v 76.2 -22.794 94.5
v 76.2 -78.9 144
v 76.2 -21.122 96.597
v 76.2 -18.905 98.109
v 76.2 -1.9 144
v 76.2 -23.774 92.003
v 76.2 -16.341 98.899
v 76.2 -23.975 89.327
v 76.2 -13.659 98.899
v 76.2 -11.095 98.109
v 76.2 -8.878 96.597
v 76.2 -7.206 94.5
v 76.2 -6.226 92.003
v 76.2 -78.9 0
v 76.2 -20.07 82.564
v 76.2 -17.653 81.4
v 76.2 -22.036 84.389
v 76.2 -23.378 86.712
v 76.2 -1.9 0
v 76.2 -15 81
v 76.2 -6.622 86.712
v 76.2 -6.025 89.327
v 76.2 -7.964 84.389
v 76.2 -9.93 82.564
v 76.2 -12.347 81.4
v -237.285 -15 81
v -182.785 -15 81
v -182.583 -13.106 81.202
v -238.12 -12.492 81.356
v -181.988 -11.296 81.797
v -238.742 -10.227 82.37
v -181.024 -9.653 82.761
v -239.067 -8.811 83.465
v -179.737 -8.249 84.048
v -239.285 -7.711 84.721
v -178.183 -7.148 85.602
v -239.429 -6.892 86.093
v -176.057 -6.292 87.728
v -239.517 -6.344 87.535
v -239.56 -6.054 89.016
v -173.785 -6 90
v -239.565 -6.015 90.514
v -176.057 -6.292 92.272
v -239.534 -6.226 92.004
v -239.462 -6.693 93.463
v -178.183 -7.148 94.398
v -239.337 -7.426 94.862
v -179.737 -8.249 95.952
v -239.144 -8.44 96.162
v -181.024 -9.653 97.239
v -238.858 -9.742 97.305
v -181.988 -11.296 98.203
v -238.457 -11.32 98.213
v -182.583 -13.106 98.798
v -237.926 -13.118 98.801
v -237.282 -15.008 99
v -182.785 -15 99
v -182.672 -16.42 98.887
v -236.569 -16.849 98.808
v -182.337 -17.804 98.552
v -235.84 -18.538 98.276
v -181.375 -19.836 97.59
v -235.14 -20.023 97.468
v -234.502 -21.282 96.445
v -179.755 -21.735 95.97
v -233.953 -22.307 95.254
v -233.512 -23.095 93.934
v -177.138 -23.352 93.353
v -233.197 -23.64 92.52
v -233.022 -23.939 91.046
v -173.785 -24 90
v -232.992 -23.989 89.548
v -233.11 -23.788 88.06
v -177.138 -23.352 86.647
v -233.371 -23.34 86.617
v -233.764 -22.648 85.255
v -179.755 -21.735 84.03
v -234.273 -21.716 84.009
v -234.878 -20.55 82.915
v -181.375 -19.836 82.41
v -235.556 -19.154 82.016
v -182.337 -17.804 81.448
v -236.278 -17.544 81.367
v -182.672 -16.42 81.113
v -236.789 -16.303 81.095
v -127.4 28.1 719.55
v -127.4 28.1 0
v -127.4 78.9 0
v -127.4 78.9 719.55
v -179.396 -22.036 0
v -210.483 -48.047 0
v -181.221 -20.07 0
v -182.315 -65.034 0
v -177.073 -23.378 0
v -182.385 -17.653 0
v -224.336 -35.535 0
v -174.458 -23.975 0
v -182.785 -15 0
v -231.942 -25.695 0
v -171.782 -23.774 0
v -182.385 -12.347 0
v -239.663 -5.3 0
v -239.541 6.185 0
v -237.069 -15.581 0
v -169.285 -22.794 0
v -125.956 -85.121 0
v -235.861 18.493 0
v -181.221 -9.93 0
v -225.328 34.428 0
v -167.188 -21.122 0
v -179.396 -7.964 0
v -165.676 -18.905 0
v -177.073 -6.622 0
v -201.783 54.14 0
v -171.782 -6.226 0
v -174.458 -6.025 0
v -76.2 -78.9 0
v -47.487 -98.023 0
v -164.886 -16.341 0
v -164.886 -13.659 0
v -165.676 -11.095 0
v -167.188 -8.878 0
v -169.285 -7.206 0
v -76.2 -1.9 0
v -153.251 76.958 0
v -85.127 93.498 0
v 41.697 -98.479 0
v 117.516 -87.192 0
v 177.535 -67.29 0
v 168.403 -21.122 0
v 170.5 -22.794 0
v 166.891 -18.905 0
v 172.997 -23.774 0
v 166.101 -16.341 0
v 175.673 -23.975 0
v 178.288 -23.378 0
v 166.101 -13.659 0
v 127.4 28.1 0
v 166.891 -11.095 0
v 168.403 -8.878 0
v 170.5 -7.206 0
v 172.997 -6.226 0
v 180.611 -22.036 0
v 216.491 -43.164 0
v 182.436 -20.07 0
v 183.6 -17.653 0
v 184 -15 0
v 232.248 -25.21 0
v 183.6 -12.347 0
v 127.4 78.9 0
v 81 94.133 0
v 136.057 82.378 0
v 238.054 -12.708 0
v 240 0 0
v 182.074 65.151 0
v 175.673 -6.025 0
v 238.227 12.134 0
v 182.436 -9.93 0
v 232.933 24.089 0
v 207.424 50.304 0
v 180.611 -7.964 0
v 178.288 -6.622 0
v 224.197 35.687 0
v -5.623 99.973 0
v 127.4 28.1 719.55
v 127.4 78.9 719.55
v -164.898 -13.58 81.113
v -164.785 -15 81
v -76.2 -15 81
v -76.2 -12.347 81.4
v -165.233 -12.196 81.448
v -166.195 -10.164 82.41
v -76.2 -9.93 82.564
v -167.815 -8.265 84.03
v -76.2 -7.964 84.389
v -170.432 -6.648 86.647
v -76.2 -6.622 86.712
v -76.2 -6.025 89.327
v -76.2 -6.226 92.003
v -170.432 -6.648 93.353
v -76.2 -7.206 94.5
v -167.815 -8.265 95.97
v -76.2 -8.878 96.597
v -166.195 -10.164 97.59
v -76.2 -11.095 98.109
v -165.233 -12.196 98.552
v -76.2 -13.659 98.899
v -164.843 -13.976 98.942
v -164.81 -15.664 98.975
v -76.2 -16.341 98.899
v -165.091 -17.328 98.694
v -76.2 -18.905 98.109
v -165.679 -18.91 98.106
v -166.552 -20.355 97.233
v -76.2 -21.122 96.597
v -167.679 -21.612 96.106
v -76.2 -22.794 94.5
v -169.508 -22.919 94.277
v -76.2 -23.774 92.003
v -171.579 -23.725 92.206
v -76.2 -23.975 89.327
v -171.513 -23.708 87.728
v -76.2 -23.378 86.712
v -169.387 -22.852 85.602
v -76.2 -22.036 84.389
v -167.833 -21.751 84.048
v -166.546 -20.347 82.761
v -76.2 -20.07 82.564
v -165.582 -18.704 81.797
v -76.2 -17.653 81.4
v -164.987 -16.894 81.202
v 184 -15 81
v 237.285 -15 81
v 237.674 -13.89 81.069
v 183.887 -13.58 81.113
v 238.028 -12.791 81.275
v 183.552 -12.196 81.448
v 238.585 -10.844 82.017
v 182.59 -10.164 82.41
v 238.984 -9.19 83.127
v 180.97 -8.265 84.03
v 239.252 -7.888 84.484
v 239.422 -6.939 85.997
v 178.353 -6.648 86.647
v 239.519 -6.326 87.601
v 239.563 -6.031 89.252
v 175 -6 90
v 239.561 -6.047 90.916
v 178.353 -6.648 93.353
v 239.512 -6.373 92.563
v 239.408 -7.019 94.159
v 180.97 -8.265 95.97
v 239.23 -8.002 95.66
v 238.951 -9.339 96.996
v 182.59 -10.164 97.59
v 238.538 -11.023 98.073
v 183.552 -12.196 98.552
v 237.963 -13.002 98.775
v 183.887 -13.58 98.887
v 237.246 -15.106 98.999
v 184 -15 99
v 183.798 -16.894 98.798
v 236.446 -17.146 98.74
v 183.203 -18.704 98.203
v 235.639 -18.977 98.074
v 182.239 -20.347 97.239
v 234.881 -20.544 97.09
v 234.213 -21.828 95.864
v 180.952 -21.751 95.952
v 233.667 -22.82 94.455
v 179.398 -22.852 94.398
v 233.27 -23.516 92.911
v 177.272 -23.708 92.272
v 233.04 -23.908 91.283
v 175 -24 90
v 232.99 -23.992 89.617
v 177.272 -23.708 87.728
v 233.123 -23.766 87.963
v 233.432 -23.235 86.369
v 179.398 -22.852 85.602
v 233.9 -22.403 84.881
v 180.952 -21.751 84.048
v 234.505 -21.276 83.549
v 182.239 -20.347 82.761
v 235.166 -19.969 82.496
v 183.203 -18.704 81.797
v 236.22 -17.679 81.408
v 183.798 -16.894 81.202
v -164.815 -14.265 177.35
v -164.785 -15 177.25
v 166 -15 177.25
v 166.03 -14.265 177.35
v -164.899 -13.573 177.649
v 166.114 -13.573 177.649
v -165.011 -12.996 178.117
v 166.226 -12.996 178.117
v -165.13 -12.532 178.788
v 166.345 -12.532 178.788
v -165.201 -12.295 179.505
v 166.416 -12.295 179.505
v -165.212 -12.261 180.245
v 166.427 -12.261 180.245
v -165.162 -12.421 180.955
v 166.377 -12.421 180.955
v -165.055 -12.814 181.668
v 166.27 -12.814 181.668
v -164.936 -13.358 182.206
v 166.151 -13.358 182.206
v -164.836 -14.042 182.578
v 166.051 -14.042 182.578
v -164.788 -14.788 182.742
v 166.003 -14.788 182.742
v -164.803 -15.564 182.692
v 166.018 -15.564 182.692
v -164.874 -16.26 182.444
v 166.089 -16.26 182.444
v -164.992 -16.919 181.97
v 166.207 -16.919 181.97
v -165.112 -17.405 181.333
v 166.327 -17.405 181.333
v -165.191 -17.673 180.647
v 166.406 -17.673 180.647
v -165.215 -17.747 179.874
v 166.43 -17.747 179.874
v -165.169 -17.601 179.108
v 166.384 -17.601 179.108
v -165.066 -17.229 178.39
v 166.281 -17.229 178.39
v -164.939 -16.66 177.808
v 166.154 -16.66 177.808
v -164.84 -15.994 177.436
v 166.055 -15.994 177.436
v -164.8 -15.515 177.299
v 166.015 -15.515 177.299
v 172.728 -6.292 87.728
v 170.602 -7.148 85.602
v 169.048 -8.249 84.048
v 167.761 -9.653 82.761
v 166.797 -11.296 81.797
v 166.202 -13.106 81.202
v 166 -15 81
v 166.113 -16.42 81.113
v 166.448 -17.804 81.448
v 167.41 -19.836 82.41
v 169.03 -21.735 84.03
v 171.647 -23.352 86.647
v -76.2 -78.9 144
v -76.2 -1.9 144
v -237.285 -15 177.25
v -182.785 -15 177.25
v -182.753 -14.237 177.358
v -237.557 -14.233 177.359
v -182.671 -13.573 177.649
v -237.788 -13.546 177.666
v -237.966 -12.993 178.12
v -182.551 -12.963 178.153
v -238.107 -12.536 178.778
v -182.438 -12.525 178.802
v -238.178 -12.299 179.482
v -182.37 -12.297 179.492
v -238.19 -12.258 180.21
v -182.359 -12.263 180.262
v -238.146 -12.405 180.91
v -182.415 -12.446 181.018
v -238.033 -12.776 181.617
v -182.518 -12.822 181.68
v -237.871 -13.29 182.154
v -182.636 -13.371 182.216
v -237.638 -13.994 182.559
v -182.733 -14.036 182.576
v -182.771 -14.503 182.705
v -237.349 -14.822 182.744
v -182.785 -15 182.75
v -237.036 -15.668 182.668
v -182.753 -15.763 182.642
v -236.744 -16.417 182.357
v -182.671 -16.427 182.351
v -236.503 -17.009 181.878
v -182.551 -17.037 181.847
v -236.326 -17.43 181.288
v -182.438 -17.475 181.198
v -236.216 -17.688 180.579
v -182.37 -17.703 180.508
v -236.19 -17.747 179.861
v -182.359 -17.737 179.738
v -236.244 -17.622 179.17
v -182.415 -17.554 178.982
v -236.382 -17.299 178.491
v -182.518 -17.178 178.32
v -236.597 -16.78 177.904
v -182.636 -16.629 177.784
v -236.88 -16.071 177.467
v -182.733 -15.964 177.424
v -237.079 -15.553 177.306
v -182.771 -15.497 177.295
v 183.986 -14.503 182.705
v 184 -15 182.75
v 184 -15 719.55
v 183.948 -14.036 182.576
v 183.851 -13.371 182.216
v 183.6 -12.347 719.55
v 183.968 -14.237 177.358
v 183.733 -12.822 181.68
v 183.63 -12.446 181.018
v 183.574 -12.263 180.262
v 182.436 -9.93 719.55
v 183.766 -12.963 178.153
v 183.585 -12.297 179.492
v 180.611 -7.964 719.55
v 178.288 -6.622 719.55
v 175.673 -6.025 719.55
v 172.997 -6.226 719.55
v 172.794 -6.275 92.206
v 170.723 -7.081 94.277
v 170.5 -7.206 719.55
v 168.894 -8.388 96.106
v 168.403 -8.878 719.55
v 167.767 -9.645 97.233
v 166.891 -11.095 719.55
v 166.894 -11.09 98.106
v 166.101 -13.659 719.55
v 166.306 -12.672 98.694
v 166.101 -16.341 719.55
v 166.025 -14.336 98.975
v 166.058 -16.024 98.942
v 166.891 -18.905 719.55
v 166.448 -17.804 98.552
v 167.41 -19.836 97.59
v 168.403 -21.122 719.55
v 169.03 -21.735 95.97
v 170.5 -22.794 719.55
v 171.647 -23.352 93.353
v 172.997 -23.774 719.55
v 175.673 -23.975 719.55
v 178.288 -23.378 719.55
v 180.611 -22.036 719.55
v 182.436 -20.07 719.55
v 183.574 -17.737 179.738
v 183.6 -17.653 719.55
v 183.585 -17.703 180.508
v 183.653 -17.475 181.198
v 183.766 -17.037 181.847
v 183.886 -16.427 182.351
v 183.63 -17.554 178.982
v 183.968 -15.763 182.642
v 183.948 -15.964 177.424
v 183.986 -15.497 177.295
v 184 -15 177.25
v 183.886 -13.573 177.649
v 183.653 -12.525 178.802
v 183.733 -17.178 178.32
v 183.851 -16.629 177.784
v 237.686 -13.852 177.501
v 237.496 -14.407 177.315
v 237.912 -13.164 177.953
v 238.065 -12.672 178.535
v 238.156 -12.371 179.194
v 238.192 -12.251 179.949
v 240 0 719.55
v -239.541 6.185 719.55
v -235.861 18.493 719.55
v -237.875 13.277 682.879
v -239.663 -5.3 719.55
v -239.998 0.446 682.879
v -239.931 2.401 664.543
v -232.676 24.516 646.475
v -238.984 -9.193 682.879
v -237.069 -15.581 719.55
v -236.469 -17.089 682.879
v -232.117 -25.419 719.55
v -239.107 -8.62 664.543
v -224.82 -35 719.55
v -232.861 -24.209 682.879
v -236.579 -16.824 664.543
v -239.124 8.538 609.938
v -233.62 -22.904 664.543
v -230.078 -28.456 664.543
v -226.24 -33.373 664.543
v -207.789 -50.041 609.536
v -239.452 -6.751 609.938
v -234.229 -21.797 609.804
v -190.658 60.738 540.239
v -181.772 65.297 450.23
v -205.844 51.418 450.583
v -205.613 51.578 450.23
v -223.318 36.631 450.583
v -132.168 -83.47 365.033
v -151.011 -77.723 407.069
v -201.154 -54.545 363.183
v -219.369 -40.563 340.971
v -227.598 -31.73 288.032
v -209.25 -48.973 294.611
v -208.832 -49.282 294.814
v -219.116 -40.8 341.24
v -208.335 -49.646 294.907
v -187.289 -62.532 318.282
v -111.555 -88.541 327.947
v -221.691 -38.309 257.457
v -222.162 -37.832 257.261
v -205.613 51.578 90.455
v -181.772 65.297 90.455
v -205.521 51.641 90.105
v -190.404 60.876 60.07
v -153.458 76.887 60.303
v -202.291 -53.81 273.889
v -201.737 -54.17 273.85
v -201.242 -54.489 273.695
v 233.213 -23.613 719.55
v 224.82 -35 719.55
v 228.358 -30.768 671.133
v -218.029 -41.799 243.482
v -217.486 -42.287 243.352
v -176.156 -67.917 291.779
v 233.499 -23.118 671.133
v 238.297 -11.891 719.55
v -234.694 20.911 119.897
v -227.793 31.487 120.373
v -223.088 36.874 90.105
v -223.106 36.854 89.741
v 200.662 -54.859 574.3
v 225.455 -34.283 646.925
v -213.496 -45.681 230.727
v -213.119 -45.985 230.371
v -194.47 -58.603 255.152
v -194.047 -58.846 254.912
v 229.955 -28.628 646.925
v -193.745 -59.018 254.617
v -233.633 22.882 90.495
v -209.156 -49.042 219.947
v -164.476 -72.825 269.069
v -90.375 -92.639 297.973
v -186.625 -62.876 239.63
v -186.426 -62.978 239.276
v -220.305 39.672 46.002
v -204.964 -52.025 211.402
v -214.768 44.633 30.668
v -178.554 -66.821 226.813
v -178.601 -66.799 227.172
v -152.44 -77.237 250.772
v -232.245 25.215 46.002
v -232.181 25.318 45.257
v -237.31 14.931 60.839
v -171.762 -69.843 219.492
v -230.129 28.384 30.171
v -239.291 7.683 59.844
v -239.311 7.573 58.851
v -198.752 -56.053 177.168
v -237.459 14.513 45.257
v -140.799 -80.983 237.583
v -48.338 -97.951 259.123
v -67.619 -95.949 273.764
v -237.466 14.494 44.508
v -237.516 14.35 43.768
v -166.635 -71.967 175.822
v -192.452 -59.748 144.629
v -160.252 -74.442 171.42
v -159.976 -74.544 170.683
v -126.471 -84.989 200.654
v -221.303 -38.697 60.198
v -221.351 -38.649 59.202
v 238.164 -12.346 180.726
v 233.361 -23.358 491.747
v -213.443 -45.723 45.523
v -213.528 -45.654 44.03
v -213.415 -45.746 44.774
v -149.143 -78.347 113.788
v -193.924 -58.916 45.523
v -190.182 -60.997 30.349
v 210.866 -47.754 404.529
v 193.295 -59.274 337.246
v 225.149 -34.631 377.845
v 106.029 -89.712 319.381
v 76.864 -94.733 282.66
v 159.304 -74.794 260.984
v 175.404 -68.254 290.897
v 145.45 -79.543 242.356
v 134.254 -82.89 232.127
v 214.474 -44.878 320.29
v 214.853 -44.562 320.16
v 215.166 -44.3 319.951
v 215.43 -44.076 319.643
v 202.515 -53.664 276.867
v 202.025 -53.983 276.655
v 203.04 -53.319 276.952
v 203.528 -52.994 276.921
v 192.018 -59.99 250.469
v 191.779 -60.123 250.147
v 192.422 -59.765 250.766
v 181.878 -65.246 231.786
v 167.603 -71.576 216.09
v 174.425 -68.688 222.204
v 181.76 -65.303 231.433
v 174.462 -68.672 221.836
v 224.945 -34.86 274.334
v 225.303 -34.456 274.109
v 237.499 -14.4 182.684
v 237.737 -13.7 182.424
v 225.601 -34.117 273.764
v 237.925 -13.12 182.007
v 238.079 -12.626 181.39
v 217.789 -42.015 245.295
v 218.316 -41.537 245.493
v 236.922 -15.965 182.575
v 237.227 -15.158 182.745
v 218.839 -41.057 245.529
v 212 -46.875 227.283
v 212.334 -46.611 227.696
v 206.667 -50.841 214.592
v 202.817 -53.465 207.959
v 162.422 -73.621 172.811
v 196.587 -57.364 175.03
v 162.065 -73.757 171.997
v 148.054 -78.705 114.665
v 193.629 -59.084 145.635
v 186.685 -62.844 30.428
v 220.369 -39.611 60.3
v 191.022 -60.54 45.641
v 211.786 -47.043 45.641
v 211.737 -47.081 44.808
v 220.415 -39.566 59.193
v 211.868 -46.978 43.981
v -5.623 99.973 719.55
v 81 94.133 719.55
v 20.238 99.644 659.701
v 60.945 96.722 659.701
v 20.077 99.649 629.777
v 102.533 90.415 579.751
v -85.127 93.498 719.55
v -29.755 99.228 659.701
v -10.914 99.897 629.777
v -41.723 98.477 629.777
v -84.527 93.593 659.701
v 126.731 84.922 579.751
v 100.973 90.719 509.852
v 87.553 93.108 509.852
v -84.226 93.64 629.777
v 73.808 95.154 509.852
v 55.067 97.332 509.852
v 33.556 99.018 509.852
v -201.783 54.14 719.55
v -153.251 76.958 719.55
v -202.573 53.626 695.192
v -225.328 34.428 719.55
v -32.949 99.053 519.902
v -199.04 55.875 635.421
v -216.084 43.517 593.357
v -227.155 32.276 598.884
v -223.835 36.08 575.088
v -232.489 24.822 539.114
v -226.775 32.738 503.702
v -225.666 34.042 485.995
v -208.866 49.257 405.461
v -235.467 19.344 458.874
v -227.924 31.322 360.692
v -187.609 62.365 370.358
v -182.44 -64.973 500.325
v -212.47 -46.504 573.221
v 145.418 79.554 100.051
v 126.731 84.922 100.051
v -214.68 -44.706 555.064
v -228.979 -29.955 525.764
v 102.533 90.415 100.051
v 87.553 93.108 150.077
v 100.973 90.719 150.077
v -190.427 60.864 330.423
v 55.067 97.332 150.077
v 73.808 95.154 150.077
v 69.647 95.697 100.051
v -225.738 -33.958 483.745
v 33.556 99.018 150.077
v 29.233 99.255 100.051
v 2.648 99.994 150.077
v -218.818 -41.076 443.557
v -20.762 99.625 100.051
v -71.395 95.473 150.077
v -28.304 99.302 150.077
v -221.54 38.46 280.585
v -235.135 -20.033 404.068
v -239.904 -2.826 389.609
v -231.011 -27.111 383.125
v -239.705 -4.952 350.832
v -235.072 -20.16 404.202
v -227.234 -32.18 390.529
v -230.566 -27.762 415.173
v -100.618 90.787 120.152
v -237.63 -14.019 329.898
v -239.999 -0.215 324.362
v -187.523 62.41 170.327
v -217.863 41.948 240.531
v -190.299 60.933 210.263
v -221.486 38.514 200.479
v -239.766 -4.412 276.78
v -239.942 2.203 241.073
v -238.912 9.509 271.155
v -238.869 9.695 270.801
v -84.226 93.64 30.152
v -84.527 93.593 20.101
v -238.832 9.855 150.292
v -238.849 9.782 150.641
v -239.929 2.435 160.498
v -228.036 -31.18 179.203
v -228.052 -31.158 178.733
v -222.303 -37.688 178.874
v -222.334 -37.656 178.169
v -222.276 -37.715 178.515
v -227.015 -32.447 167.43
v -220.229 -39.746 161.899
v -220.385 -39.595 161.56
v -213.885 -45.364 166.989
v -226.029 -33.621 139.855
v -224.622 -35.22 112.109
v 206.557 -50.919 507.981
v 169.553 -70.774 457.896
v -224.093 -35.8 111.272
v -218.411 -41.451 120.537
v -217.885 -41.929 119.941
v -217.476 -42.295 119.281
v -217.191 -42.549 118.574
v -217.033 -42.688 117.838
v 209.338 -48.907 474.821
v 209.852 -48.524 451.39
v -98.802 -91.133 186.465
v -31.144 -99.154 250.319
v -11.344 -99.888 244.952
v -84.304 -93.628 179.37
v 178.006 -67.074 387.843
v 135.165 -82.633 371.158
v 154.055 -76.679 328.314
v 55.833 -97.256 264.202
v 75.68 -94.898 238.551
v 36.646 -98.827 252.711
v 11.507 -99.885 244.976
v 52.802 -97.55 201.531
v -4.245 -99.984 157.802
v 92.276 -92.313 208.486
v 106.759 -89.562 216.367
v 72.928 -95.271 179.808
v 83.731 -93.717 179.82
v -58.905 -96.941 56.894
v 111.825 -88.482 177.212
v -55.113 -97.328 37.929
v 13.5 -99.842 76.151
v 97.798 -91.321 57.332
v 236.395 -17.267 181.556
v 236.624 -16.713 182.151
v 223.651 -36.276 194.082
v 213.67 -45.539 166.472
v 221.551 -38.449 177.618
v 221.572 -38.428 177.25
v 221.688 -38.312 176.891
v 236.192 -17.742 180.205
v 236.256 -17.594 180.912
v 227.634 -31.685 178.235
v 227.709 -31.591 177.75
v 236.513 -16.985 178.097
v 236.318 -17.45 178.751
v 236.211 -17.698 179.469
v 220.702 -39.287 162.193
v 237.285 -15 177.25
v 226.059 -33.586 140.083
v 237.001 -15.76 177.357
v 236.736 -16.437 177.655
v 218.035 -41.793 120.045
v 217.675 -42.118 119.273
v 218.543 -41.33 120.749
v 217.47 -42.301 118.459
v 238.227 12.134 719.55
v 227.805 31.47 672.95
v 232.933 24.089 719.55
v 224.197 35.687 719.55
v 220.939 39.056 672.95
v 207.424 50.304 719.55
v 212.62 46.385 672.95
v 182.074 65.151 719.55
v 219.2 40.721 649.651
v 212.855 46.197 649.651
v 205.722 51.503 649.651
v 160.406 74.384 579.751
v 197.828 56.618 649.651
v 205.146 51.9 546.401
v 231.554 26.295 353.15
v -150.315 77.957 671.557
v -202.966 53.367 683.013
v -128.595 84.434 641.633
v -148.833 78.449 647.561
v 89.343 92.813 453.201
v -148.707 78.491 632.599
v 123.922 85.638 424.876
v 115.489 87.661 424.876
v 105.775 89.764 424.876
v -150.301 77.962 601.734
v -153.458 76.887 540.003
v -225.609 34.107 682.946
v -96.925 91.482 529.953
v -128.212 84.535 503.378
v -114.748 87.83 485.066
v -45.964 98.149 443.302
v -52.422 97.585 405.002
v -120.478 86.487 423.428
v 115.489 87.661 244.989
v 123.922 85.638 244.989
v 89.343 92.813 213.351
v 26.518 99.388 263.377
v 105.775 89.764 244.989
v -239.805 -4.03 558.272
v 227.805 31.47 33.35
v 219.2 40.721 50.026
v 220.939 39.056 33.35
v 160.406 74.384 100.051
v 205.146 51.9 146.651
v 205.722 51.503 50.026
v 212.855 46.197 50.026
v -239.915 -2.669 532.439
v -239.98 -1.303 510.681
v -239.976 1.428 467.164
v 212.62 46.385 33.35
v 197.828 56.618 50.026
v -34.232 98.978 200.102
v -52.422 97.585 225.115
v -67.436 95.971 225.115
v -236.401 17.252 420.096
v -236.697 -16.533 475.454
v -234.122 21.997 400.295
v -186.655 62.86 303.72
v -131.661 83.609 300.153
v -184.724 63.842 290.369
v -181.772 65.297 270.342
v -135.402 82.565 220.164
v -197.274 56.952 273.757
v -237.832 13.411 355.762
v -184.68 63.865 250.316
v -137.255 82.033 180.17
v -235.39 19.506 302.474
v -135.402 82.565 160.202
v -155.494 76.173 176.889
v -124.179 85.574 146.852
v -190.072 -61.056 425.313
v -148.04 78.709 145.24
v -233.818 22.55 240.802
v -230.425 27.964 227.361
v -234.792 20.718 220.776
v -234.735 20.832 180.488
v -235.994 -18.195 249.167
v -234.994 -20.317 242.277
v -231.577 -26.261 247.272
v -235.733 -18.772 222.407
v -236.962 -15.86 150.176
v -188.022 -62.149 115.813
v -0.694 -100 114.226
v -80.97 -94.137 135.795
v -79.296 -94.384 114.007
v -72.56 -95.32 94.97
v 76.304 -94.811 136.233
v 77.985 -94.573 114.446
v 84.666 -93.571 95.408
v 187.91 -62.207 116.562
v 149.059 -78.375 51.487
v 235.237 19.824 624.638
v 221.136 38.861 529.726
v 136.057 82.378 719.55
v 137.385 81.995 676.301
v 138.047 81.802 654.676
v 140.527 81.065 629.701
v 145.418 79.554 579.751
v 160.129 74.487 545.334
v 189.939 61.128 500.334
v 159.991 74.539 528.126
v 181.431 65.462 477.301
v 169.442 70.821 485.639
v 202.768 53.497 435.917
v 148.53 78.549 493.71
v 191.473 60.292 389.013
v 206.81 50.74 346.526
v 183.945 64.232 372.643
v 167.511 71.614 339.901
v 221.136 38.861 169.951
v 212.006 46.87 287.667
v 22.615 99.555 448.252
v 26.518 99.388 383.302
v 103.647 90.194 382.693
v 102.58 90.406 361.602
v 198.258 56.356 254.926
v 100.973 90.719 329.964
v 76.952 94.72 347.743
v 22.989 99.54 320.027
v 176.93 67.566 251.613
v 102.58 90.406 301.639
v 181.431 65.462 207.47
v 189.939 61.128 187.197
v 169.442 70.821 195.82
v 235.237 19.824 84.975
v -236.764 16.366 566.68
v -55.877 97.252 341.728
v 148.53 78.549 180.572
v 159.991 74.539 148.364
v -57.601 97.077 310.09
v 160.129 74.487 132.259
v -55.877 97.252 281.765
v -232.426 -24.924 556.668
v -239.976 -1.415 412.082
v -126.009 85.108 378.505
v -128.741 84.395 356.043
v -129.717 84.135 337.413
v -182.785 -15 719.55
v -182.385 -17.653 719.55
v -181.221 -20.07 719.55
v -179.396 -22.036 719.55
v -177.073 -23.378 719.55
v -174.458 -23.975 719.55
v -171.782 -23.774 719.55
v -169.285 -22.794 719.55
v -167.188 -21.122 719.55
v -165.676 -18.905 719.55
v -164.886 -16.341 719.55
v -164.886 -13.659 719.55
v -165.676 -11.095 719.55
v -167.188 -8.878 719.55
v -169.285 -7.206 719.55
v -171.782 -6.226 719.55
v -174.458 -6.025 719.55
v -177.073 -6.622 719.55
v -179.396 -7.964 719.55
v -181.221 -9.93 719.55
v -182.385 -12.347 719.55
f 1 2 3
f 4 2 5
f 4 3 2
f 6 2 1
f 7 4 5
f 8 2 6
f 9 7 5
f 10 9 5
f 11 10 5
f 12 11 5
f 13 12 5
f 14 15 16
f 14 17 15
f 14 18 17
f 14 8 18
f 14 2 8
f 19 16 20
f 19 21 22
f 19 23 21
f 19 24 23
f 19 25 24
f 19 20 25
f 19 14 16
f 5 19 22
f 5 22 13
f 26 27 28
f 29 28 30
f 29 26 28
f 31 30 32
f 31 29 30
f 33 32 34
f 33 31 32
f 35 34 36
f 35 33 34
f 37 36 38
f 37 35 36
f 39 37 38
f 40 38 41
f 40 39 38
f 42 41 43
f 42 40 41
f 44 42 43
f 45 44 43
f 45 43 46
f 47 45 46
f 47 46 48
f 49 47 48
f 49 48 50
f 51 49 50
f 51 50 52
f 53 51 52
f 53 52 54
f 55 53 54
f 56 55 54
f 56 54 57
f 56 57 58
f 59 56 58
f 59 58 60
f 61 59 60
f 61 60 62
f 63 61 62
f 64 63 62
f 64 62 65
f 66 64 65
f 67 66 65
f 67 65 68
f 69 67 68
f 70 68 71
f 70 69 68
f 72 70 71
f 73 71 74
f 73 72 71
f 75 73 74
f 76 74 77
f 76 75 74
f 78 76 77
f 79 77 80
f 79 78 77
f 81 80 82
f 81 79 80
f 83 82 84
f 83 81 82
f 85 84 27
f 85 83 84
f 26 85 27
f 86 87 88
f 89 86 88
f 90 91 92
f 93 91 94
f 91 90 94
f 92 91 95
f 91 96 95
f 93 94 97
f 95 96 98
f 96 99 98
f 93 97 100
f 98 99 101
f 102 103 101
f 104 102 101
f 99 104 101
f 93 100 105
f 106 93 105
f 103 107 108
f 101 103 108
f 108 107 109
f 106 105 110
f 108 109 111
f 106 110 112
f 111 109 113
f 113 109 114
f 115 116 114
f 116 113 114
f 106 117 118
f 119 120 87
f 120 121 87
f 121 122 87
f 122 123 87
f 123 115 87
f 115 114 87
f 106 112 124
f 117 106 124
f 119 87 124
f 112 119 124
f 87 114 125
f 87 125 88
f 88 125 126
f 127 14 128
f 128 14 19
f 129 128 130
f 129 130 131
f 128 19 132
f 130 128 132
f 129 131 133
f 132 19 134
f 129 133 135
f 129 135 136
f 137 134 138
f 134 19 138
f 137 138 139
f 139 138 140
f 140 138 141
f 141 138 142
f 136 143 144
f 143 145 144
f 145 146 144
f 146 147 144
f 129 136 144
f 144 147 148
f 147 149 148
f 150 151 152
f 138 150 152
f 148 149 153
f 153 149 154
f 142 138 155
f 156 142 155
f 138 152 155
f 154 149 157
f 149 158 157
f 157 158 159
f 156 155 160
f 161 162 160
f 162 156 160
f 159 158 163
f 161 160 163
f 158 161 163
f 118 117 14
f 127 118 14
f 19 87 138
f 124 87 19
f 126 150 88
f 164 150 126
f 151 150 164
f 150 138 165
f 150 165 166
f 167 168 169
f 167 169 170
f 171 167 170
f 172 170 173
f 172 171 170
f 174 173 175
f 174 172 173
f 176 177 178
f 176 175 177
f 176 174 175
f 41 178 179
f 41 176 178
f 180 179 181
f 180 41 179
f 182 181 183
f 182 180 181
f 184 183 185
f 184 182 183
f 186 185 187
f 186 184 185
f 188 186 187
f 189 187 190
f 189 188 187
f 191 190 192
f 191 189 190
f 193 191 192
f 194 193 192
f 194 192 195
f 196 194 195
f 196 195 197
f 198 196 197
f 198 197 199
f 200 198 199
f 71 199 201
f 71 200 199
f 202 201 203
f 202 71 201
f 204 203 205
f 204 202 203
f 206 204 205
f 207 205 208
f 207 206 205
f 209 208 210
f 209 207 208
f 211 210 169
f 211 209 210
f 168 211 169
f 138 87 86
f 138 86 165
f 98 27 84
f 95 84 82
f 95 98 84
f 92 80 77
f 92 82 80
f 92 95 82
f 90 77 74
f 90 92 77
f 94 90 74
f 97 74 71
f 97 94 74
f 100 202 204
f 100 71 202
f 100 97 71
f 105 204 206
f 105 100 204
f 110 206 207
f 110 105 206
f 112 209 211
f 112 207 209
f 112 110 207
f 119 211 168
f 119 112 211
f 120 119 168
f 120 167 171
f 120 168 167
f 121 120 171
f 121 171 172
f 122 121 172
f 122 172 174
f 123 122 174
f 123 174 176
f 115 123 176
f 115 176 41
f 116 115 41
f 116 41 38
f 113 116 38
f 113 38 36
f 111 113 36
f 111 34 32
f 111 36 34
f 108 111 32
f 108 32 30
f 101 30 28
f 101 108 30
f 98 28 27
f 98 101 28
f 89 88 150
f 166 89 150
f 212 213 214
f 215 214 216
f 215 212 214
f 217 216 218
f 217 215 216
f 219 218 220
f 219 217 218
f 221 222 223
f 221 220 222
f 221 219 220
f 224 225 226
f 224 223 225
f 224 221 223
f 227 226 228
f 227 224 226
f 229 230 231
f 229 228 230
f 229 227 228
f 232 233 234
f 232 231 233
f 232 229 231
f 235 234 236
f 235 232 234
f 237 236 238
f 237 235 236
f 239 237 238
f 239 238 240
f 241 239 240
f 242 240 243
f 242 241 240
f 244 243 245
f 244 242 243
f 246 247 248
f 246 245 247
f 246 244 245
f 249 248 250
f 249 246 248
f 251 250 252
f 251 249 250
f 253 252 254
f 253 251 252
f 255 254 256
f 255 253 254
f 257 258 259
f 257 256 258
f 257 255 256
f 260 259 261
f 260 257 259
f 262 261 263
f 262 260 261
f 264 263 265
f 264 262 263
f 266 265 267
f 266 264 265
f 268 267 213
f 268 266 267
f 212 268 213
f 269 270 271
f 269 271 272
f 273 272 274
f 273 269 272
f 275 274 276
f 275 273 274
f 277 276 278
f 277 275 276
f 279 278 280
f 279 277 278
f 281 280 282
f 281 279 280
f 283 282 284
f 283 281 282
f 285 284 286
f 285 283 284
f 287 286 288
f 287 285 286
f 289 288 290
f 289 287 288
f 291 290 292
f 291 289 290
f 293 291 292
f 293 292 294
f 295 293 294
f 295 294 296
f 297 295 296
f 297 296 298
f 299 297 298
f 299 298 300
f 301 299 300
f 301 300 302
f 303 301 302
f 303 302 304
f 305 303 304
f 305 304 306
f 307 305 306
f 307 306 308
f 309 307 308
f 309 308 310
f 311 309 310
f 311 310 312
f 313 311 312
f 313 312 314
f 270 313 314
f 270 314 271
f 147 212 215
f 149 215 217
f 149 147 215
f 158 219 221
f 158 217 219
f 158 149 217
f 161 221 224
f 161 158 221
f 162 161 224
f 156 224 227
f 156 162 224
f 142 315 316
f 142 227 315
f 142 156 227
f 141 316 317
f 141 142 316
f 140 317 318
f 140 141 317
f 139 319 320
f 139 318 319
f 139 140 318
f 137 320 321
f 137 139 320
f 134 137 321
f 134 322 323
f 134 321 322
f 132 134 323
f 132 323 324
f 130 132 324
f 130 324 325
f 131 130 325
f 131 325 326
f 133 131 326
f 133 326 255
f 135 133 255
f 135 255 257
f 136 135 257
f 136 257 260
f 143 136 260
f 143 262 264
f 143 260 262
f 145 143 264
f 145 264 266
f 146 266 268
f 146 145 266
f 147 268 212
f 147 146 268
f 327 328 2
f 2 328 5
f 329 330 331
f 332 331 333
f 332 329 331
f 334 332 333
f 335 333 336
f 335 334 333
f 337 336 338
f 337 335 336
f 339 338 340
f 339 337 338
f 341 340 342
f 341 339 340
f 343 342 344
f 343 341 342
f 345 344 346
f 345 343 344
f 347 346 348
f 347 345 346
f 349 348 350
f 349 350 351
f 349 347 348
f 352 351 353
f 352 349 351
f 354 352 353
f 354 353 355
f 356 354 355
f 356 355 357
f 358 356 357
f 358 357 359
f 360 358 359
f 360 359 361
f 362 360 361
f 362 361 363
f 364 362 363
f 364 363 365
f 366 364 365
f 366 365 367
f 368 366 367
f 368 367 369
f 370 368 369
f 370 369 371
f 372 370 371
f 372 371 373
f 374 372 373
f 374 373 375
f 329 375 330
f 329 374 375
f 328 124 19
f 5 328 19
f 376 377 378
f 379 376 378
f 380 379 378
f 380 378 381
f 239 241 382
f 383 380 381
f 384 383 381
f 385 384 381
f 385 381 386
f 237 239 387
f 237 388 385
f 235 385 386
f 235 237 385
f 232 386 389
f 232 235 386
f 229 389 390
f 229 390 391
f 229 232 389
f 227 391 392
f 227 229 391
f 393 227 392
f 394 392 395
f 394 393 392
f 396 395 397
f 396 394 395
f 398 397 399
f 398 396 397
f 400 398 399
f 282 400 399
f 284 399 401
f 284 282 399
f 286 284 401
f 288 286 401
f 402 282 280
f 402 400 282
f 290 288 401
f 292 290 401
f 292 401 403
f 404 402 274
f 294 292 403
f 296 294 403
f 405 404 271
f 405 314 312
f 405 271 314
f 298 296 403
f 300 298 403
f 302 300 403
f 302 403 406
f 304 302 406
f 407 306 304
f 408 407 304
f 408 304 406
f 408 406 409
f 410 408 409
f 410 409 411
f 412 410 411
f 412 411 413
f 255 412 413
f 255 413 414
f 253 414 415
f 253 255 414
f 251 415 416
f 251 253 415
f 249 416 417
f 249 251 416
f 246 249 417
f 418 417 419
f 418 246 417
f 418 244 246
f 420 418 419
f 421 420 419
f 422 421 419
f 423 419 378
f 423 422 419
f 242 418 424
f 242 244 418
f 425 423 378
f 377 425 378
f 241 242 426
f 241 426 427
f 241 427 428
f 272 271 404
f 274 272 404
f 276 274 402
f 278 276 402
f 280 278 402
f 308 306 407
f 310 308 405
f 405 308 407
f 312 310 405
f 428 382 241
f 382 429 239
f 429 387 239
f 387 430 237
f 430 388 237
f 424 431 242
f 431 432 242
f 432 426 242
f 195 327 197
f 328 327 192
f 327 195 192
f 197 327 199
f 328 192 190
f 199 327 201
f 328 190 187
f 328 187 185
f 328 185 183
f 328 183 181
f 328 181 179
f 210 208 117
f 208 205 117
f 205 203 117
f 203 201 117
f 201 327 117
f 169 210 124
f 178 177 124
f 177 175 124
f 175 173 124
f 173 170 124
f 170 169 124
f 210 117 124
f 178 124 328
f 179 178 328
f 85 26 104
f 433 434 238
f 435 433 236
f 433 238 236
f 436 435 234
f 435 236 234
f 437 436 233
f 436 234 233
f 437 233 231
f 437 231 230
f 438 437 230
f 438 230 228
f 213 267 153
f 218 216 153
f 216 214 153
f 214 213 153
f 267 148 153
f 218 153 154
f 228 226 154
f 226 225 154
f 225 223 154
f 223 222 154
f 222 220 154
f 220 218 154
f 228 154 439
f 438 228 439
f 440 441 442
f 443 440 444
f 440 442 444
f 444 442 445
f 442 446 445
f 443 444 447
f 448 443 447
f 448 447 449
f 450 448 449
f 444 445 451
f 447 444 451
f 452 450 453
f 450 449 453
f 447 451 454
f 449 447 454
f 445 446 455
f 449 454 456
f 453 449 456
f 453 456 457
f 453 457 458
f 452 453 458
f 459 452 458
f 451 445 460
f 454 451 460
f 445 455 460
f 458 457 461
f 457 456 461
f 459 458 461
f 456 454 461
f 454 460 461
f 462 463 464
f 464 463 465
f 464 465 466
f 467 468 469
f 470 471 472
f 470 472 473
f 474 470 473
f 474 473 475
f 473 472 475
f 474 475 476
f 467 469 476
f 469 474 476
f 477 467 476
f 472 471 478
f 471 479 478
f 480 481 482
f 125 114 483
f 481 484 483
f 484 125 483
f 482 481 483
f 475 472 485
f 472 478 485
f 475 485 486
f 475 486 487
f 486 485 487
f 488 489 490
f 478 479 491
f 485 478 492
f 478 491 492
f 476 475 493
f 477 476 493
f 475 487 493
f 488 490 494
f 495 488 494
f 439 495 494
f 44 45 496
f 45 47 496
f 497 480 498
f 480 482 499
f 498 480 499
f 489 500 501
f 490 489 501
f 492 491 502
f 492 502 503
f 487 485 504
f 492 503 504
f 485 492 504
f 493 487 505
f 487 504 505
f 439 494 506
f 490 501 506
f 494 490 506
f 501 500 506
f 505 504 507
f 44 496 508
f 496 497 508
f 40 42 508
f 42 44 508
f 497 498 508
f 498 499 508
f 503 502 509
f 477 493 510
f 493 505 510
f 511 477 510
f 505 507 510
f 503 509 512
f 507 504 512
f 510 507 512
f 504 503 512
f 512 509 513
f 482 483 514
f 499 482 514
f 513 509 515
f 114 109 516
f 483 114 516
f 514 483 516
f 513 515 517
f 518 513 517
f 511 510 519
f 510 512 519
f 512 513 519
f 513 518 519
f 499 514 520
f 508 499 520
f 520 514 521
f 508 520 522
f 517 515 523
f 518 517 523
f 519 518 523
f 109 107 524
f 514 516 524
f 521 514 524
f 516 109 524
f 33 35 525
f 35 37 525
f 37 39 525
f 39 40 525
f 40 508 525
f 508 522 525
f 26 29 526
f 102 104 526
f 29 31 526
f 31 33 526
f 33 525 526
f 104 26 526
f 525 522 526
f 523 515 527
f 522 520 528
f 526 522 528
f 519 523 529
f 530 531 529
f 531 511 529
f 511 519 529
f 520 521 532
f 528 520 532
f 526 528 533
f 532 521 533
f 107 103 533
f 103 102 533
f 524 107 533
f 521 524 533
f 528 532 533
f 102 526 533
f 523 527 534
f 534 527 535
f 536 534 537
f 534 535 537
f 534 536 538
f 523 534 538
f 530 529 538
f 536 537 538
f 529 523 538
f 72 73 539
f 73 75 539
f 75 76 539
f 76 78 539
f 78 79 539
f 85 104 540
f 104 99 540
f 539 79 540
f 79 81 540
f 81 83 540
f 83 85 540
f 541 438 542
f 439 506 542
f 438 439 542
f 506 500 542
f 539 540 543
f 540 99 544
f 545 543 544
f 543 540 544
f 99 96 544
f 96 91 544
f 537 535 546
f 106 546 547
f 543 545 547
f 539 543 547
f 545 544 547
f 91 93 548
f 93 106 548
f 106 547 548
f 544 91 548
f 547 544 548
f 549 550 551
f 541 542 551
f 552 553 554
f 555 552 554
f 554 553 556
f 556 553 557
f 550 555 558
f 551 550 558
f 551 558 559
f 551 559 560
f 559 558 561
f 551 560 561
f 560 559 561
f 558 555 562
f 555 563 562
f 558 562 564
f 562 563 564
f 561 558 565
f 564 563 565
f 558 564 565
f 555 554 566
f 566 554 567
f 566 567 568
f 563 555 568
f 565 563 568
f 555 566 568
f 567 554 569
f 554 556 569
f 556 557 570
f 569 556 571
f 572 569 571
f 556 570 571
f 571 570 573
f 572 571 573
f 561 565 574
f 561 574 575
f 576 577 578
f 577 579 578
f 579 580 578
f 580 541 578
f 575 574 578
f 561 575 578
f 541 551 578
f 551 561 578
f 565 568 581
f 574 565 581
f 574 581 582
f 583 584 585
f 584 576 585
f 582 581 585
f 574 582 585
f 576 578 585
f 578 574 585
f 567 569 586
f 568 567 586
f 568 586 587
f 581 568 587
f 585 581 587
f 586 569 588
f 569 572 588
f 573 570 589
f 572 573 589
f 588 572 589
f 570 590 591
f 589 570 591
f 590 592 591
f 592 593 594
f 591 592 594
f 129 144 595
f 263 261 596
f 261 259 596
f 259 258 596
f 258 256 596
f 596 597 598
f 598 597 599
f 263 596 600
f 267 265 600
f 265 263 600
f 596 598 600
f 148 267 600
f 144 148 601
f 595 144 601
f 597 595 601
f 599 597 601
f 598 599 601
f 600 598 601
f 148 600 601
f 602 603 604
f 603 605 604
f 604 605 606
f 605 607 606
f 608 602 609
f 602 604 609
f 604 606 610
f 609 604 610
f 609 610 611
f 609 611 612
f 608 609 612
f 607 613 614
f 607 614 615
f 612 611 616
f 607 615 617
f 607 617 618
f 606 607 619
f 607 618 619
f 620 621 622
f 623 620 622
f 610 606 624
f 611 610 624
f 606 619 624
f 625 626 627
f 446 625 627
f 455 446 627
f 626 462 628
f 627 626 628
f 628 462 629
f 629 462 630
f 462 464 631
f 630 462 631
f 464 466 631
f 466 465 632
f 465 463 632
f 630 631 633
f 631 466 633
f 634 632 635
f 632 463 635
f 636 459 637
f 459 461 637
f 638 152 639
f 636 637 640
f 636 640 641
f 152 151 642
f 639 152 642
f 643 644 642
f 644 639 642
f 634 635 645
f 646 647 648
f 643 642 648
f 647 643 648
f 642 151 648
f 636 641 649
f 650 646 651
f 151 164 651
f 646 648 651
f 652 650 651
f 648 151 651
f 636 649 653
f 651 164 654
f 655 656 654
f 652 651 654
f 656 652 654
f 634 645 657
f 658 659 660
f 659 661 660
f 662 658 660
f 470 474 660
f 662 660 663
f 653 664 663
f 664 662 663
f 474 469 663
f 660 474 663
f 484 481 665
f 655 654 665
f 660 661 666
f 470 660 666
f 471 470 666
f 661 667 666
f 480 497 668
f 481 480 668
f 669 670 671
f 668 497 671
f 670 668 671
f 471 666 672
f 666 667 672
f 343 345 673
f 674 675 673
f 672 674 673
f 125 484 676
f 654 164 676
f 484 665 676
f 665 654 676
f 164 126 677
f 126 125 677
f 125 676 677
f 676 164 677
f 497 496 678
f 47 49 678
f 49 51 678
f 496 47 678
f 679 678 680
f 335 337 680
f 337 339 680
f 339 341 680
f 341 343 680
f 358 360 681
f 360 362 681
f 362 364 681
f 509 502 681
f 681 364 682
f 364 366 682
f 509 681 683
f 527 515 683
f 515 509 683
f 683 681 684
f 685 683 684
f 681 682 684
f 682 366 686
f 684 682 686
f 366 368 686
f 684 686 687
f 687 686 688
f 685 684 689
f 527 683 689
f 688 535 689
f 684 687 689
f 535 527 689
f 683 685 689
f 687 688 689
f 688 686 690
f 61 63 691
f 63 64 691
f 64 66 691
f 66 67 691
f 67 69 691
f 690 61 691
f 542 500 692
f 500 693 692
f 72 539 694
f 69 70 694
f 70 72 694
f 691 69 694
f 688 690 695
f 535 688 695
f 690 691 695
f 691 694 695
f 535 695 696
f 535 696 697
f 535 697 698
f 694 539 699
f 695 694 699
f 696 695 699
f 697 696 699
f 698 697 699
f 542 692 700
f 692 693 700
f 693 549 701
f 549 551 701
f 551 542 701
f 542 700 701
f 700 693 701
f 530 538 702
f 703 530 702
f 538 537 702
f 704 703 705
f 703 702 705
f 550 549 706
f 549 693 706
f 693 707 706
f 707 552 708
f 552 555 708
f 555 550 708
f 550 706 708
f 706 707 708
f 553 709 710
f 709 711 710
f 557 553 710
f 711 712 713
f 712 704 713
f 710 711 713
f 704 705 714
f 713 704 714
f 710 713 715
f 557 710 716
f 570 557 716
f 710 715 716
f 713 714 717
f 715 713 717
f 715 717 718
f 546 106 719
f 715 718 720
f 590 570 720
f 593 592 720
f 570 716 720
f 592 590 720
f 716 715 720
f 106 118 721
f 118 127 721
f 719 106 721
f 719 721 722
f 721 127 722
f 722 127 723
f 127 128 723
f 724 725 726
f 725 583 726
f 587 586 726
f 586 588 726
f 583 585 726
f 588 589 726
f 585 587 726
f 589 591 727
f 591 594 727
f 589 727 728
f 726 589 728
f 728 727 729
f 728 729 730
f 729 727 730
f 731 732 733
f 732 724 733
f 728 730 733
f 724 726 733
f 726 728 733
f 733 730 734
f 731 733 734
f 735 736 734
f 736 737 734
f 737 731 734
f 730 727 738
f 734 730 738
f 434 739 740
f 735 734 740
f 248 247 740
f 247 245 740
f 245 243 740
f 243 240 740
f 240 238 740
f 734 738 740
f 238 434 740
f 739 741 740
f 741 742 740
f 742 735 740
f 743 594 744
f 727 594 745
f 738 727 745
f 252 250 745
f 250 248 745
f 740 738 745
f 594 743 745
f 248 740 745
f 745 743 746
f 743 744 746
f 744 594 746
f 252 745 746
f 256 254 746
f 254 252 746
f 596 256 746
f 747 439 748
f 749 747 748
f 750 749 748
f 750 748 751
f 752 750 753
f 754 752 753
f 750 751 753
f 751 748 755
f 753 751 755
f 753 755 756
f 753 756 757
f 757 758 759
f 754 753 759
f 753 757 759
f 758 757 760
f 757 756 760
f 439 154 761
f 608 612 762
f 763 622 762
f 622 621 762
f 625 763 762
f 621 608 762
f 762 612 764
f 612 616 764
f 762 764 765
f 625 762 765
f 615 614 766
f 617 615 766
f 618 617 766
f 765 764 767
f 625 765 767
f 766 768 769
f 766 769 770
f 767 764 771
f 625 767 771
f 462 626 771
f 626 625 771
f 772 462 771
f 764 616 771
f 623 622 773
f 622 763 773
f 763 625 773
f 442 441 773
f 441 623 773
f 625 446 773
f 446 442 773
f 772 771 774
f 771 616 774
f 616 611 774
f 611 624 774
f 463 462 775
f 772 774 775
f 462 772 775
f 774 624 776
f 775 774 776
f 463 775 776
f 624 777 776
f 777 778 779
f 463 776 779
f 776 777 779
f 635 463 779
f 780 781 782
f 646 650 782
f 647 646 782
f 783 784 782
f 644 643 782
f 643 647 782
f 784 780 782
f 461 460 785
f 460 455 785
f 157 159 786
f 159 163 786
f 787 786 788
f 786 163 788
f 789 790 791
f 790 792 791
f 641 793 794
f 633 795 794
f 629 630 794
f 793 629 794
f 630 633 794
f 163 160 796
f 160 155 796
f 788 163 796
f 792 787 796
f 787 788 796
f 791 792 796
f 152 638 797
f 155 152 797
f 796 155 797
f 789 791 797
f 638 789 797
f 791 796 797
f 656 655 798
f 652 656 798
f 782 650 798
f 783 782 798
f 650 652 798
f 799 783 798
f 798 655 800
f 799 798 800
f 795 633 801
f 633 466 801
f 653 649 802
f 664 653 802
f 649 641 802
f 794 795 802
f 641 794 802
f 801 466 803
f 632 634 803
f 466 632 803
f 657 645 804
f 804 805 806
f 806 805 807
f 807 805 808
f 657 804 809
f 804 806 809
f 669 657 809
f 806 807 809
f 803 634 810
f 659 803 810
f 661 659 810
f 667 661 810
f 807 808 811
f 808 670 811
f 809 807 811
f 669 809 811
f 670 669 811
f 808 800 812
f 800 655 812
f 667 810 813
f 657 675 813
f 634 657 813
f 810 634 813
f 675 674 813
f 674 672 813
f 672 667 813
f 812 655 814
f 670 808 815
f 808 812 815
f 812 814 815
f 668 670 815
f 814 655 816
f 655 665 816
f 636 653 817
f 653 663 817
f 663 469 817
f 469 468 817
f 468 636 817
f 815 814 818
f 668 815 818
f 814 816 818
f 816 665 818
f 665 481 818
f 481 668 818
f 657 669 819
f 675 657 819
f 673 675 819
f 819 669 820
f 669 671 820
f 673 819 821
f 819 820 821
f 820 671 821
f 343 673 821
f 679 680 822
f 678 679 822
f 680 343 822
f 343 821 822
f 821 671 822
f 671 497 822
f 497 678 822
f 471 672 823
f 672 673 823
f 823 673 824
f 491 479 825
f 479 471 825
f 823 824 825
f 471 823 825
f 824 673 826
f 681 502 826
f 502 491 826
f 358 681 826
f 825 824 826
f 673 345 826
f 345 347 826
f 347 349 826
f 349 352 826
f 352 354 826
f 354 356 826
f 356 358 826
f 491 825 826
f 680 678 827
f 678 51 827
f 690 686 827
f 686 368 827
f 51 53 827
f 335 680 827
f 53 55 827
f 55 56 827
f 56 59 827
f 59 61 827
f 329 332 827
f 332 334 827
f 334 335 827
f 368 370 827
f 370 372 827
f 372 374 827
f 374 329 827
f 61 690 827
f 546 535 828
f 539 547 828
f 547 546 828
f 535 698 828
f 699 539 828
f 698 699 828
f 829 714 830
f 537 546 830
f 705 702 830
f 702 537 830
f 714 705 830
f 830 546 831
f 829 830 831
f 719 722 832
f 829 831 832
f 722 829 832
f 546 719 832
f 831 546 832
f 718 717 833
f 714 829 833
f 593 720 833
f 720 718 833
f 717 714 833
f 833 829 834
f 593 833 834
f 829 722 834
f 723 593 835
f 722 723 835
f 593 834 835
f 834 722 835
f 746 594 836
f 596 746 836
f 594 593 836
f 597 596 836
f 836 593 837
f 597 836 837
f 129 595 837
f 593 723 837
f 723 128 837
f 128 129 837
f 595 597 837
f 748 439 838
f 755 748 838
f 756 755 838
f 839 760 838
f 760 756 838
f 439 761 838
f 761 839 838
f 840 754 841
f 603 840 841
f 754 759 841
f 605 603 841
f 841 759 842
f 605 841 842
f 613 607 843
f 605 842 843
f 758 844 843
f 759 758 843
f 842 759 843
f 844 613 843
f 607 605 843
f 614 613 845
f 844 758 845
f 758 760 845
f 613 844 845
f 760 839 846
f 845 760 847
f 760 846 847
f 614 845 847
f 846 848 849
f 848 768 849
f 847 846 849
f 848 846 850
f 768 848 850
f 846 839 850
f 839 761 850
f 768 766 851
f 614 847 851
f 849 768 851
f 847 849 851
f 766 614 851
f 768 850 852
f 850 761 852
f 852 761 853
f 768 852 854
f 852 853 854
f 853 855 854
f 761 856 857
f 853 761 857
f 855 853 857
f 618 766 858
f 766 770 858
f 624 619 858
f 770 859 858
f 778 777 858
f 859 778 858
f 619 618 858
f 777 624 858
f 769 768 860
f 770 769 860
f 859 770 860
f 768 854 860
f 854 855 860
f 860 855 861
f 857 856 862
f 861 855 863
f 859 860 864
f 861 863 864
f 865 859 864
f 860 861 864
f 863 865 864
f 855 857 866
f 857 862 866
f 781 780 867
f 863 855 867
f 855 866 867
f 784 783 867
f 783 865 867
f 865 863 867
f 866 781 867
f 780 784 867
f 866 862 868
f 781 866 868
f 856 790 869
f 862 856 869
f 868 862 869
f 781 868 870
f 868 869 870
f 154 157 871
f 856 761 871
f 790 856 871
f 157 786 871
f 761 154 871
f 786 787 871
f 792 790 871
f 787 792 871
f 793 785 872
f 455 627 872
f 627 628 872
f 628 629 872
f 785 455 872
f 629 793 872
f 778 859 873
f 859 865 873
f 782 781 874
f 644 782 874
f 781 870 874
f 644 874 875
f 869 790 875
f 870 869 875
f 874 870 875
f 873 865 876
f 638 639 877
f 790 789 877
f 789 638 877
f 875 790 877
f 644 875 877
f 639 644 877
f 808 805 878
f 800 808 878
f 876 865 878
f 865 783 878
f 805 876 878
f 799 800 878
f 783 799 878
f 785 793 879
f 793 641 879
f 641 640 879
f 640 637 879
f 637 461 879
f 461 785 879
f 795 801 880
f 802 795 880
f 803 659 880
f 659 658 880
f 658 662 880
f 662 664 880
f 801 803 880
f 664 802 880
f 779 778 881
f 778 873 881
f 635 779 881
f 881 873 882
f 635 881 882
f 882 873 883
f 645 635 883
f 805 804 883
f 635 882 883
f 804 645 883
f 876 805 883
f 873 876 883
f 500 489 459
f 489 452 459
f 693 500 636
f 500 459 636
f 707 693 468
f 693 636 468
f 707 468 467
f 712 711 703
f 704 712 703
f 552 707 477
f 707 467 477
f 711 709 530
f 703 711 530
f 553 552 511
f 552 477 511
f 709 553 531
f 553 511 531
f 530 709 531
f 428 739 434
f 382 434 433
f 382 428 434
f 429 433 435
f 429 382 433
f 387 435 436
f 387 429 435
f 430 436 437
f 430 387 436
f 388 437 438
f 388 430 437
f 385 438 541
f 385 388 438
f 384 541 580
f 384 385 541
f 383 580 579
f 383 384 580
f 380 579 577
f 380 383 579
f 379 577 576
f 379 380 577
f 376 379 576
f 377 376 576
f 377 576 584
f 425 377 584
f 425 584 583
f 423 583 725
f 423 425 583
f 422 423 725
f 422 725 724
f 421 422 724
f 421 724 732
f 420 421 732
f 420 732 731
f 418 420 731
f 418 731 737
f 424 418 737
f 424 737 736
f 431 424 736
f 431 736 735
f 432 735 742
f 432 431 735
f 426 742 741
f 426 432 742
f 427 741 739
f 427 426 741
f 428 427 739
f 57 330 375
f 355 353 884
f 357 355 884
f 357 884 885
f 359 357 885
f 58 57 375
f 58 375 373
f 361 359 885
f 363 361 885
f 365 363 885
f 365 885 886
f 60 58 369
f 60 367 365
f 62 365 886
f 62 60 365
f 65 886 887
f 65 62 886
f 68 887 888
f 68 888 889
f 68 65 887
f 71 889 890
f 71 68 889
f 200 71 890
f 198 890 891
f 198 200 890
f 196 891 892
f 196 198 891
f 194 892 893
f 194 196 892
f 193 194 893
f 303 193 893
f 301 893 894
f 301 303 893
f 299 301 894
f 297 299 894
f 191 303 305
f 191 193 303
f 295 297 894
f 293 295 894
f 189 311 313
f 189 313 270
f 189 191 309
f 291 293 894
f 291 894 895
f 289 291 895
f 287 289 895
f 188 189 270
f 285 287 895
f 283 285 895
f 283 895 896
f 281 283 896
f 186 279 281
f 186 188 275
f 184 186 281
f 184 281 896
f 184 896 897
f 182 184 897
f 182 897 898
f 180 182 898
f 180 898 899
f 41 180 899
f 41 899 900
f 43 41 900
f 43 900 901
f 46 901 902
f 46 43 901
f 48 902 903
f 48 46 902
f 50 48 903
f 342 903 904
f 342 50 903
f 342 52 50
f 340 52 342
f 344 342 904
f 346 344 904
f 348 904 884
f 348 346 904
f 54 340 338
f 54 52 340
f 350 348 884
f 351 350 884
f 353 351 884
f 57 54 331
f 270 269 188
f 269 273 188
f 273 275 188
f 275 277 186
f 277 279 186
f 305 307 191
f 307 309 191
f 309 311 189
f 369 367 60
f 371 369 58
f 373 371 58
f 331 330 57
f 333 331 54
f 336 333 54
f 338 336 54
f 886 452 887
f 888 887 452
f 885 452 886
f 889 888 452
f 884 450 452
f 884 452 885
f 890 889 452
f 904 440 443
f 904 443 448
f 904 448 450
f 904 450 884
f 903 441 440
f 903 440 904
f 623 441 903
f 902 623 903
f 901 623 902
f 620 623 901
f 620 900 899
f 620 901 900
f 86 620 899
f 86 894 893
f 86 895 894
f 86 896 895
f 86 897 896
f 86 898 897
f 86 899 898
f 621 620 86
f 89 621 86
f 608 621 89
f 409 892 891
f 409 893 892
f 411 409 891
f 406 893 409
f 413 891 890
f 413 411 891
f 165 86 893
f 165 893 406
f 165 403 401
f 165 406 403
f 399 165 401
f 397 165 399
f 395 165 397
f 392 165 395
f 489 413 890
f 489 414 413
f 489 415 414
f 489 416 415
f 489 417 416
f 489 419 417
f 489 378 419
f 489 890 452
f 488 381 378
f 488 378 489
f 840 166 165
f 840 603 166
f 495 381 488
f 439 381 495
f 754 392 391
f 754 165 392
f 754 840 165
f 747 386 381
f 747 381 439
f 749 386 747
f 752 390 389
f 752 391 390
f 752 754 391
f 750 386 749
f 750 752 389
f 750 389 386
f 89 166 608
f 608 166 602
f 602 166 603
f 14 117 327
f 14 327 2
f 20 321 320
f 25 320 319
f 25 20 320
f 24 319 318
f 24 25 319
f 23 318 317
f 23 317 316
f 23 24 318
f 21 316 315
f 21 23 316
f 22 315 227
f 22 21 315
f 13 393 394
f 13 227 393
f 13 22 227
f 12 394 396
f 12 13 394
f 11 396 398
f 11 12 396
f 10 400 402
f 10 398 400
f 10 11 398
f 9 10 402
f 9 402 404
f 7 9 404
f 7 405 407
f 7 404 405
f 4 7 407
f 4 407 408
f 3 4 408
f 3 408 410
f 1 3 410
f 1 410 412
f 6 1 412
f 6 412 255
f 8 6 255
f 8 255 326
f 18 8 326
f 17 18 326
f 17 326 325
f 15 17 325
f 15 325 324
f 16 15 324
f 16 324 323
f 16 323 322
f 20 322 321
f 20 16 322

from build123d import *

# Parameters (mm, degrees)
SKETCH1_RX               = 240
SKETCH1_RY               = 100
SKETCH1_R                = 9
SKETCH1_W                = 254.8
SKETCH1_H                = 50.8
BOSS_EXTRUDE1_DEPTH      = 719.55
CUT_EXTRUDE1_DEPTH       = 766.083134372
CUT_EXTRUDE1_DEPTH_BACK  = 766.083134372
SKETCH7_W                = 152.4
SKETCH7_H                = 77
CUT_EXTRUDE2_DEPTH       = 144
CUT_EXTRUDE3_START       = -241
CUT_EXTRUDE3_OUTLINE_R   = 9
CUT_EXTRUDE3_OUTLINE_R_2 = 2.75
CUT_EXTRUDE3_DEPTH       = 482


with BuildPart() as part:
    # Sketch1 → Boss-Extrude1 (new body)
    with BuildSketch(Plane.XY):
        with Locations((0, 0)):
            Ellipse(SKETCH1_RX, SKETCH1_RY)
        with Locations((175, -15)):
            Circle(SKETCH1_R, mode=Mode.SUBTRACT)
        with Locations(Location((-173.785, -15, 0), (0, 0, 180))):
            Circle(SKETCH1_R, mode=Mode.SUBTRACT)
        with Locations((0, 53.5)):
            Rectangle(SKETCH1_W, SKETCH1_H, mode=Mode.SUBTRACT)
    extrude(amount=BOSS_EXTRUDE1_DEPTH)

    # Sketch3 → Cut-Extrude1 (cut, two sides: drawn at the far end of the back side and taken through both)
    with BuildSketch(Plane(origin=(0, 0, 0), x_dir=(0, 0, -1), z_dir=(1, 0, 0)).offset(-CUT_EXTRUDE1_DEPTH_BACK)):
        Polygon((-719.55, -100), (-719.55, -35), (-244.134429793, -100), align=None)
    extrude(amount=CUT_EXTRUDE1_DEPTH + CUT_EXTRUDE1_DEPTH_BACK, mode=Mode.SUBTRACT)

    # Sketch7 → Cut-Extrude2 (cut)
    with BuildSketch(Plane.XY):
        with Locations((0, -40.4)):
            Rectangle(SKETCH7_W, SKETCH7_H)
    extrude(amount=CUT_EXTRUDE2_DEPTH, mode=Mode.SUBTRACT)

    # Cut-Extrude3: read off the stored shape, not the designer's step
    # Cut-Extrude3 outline → Cut-Extrude3 (cut)
    with BuildSketch(Plane(origin=(0, 0, 0), x_dir=(0, 0, -1), z_dir=(1, 0, 0)).offset(CUT_EXTRUDE3_START)):
        with Locations((-90, -15)):
            Circle(CUT_EXTRUDE3_OUTLINE_R)
        with Locations((-180, -15)):
            Circle(CUT_EXTRUDE3_OUTLINE_R_2)
    extrude(amount=CUT_EXTRUDE3_DEPTH, mode=Mode.SUBTRACT)


solid = part.part
